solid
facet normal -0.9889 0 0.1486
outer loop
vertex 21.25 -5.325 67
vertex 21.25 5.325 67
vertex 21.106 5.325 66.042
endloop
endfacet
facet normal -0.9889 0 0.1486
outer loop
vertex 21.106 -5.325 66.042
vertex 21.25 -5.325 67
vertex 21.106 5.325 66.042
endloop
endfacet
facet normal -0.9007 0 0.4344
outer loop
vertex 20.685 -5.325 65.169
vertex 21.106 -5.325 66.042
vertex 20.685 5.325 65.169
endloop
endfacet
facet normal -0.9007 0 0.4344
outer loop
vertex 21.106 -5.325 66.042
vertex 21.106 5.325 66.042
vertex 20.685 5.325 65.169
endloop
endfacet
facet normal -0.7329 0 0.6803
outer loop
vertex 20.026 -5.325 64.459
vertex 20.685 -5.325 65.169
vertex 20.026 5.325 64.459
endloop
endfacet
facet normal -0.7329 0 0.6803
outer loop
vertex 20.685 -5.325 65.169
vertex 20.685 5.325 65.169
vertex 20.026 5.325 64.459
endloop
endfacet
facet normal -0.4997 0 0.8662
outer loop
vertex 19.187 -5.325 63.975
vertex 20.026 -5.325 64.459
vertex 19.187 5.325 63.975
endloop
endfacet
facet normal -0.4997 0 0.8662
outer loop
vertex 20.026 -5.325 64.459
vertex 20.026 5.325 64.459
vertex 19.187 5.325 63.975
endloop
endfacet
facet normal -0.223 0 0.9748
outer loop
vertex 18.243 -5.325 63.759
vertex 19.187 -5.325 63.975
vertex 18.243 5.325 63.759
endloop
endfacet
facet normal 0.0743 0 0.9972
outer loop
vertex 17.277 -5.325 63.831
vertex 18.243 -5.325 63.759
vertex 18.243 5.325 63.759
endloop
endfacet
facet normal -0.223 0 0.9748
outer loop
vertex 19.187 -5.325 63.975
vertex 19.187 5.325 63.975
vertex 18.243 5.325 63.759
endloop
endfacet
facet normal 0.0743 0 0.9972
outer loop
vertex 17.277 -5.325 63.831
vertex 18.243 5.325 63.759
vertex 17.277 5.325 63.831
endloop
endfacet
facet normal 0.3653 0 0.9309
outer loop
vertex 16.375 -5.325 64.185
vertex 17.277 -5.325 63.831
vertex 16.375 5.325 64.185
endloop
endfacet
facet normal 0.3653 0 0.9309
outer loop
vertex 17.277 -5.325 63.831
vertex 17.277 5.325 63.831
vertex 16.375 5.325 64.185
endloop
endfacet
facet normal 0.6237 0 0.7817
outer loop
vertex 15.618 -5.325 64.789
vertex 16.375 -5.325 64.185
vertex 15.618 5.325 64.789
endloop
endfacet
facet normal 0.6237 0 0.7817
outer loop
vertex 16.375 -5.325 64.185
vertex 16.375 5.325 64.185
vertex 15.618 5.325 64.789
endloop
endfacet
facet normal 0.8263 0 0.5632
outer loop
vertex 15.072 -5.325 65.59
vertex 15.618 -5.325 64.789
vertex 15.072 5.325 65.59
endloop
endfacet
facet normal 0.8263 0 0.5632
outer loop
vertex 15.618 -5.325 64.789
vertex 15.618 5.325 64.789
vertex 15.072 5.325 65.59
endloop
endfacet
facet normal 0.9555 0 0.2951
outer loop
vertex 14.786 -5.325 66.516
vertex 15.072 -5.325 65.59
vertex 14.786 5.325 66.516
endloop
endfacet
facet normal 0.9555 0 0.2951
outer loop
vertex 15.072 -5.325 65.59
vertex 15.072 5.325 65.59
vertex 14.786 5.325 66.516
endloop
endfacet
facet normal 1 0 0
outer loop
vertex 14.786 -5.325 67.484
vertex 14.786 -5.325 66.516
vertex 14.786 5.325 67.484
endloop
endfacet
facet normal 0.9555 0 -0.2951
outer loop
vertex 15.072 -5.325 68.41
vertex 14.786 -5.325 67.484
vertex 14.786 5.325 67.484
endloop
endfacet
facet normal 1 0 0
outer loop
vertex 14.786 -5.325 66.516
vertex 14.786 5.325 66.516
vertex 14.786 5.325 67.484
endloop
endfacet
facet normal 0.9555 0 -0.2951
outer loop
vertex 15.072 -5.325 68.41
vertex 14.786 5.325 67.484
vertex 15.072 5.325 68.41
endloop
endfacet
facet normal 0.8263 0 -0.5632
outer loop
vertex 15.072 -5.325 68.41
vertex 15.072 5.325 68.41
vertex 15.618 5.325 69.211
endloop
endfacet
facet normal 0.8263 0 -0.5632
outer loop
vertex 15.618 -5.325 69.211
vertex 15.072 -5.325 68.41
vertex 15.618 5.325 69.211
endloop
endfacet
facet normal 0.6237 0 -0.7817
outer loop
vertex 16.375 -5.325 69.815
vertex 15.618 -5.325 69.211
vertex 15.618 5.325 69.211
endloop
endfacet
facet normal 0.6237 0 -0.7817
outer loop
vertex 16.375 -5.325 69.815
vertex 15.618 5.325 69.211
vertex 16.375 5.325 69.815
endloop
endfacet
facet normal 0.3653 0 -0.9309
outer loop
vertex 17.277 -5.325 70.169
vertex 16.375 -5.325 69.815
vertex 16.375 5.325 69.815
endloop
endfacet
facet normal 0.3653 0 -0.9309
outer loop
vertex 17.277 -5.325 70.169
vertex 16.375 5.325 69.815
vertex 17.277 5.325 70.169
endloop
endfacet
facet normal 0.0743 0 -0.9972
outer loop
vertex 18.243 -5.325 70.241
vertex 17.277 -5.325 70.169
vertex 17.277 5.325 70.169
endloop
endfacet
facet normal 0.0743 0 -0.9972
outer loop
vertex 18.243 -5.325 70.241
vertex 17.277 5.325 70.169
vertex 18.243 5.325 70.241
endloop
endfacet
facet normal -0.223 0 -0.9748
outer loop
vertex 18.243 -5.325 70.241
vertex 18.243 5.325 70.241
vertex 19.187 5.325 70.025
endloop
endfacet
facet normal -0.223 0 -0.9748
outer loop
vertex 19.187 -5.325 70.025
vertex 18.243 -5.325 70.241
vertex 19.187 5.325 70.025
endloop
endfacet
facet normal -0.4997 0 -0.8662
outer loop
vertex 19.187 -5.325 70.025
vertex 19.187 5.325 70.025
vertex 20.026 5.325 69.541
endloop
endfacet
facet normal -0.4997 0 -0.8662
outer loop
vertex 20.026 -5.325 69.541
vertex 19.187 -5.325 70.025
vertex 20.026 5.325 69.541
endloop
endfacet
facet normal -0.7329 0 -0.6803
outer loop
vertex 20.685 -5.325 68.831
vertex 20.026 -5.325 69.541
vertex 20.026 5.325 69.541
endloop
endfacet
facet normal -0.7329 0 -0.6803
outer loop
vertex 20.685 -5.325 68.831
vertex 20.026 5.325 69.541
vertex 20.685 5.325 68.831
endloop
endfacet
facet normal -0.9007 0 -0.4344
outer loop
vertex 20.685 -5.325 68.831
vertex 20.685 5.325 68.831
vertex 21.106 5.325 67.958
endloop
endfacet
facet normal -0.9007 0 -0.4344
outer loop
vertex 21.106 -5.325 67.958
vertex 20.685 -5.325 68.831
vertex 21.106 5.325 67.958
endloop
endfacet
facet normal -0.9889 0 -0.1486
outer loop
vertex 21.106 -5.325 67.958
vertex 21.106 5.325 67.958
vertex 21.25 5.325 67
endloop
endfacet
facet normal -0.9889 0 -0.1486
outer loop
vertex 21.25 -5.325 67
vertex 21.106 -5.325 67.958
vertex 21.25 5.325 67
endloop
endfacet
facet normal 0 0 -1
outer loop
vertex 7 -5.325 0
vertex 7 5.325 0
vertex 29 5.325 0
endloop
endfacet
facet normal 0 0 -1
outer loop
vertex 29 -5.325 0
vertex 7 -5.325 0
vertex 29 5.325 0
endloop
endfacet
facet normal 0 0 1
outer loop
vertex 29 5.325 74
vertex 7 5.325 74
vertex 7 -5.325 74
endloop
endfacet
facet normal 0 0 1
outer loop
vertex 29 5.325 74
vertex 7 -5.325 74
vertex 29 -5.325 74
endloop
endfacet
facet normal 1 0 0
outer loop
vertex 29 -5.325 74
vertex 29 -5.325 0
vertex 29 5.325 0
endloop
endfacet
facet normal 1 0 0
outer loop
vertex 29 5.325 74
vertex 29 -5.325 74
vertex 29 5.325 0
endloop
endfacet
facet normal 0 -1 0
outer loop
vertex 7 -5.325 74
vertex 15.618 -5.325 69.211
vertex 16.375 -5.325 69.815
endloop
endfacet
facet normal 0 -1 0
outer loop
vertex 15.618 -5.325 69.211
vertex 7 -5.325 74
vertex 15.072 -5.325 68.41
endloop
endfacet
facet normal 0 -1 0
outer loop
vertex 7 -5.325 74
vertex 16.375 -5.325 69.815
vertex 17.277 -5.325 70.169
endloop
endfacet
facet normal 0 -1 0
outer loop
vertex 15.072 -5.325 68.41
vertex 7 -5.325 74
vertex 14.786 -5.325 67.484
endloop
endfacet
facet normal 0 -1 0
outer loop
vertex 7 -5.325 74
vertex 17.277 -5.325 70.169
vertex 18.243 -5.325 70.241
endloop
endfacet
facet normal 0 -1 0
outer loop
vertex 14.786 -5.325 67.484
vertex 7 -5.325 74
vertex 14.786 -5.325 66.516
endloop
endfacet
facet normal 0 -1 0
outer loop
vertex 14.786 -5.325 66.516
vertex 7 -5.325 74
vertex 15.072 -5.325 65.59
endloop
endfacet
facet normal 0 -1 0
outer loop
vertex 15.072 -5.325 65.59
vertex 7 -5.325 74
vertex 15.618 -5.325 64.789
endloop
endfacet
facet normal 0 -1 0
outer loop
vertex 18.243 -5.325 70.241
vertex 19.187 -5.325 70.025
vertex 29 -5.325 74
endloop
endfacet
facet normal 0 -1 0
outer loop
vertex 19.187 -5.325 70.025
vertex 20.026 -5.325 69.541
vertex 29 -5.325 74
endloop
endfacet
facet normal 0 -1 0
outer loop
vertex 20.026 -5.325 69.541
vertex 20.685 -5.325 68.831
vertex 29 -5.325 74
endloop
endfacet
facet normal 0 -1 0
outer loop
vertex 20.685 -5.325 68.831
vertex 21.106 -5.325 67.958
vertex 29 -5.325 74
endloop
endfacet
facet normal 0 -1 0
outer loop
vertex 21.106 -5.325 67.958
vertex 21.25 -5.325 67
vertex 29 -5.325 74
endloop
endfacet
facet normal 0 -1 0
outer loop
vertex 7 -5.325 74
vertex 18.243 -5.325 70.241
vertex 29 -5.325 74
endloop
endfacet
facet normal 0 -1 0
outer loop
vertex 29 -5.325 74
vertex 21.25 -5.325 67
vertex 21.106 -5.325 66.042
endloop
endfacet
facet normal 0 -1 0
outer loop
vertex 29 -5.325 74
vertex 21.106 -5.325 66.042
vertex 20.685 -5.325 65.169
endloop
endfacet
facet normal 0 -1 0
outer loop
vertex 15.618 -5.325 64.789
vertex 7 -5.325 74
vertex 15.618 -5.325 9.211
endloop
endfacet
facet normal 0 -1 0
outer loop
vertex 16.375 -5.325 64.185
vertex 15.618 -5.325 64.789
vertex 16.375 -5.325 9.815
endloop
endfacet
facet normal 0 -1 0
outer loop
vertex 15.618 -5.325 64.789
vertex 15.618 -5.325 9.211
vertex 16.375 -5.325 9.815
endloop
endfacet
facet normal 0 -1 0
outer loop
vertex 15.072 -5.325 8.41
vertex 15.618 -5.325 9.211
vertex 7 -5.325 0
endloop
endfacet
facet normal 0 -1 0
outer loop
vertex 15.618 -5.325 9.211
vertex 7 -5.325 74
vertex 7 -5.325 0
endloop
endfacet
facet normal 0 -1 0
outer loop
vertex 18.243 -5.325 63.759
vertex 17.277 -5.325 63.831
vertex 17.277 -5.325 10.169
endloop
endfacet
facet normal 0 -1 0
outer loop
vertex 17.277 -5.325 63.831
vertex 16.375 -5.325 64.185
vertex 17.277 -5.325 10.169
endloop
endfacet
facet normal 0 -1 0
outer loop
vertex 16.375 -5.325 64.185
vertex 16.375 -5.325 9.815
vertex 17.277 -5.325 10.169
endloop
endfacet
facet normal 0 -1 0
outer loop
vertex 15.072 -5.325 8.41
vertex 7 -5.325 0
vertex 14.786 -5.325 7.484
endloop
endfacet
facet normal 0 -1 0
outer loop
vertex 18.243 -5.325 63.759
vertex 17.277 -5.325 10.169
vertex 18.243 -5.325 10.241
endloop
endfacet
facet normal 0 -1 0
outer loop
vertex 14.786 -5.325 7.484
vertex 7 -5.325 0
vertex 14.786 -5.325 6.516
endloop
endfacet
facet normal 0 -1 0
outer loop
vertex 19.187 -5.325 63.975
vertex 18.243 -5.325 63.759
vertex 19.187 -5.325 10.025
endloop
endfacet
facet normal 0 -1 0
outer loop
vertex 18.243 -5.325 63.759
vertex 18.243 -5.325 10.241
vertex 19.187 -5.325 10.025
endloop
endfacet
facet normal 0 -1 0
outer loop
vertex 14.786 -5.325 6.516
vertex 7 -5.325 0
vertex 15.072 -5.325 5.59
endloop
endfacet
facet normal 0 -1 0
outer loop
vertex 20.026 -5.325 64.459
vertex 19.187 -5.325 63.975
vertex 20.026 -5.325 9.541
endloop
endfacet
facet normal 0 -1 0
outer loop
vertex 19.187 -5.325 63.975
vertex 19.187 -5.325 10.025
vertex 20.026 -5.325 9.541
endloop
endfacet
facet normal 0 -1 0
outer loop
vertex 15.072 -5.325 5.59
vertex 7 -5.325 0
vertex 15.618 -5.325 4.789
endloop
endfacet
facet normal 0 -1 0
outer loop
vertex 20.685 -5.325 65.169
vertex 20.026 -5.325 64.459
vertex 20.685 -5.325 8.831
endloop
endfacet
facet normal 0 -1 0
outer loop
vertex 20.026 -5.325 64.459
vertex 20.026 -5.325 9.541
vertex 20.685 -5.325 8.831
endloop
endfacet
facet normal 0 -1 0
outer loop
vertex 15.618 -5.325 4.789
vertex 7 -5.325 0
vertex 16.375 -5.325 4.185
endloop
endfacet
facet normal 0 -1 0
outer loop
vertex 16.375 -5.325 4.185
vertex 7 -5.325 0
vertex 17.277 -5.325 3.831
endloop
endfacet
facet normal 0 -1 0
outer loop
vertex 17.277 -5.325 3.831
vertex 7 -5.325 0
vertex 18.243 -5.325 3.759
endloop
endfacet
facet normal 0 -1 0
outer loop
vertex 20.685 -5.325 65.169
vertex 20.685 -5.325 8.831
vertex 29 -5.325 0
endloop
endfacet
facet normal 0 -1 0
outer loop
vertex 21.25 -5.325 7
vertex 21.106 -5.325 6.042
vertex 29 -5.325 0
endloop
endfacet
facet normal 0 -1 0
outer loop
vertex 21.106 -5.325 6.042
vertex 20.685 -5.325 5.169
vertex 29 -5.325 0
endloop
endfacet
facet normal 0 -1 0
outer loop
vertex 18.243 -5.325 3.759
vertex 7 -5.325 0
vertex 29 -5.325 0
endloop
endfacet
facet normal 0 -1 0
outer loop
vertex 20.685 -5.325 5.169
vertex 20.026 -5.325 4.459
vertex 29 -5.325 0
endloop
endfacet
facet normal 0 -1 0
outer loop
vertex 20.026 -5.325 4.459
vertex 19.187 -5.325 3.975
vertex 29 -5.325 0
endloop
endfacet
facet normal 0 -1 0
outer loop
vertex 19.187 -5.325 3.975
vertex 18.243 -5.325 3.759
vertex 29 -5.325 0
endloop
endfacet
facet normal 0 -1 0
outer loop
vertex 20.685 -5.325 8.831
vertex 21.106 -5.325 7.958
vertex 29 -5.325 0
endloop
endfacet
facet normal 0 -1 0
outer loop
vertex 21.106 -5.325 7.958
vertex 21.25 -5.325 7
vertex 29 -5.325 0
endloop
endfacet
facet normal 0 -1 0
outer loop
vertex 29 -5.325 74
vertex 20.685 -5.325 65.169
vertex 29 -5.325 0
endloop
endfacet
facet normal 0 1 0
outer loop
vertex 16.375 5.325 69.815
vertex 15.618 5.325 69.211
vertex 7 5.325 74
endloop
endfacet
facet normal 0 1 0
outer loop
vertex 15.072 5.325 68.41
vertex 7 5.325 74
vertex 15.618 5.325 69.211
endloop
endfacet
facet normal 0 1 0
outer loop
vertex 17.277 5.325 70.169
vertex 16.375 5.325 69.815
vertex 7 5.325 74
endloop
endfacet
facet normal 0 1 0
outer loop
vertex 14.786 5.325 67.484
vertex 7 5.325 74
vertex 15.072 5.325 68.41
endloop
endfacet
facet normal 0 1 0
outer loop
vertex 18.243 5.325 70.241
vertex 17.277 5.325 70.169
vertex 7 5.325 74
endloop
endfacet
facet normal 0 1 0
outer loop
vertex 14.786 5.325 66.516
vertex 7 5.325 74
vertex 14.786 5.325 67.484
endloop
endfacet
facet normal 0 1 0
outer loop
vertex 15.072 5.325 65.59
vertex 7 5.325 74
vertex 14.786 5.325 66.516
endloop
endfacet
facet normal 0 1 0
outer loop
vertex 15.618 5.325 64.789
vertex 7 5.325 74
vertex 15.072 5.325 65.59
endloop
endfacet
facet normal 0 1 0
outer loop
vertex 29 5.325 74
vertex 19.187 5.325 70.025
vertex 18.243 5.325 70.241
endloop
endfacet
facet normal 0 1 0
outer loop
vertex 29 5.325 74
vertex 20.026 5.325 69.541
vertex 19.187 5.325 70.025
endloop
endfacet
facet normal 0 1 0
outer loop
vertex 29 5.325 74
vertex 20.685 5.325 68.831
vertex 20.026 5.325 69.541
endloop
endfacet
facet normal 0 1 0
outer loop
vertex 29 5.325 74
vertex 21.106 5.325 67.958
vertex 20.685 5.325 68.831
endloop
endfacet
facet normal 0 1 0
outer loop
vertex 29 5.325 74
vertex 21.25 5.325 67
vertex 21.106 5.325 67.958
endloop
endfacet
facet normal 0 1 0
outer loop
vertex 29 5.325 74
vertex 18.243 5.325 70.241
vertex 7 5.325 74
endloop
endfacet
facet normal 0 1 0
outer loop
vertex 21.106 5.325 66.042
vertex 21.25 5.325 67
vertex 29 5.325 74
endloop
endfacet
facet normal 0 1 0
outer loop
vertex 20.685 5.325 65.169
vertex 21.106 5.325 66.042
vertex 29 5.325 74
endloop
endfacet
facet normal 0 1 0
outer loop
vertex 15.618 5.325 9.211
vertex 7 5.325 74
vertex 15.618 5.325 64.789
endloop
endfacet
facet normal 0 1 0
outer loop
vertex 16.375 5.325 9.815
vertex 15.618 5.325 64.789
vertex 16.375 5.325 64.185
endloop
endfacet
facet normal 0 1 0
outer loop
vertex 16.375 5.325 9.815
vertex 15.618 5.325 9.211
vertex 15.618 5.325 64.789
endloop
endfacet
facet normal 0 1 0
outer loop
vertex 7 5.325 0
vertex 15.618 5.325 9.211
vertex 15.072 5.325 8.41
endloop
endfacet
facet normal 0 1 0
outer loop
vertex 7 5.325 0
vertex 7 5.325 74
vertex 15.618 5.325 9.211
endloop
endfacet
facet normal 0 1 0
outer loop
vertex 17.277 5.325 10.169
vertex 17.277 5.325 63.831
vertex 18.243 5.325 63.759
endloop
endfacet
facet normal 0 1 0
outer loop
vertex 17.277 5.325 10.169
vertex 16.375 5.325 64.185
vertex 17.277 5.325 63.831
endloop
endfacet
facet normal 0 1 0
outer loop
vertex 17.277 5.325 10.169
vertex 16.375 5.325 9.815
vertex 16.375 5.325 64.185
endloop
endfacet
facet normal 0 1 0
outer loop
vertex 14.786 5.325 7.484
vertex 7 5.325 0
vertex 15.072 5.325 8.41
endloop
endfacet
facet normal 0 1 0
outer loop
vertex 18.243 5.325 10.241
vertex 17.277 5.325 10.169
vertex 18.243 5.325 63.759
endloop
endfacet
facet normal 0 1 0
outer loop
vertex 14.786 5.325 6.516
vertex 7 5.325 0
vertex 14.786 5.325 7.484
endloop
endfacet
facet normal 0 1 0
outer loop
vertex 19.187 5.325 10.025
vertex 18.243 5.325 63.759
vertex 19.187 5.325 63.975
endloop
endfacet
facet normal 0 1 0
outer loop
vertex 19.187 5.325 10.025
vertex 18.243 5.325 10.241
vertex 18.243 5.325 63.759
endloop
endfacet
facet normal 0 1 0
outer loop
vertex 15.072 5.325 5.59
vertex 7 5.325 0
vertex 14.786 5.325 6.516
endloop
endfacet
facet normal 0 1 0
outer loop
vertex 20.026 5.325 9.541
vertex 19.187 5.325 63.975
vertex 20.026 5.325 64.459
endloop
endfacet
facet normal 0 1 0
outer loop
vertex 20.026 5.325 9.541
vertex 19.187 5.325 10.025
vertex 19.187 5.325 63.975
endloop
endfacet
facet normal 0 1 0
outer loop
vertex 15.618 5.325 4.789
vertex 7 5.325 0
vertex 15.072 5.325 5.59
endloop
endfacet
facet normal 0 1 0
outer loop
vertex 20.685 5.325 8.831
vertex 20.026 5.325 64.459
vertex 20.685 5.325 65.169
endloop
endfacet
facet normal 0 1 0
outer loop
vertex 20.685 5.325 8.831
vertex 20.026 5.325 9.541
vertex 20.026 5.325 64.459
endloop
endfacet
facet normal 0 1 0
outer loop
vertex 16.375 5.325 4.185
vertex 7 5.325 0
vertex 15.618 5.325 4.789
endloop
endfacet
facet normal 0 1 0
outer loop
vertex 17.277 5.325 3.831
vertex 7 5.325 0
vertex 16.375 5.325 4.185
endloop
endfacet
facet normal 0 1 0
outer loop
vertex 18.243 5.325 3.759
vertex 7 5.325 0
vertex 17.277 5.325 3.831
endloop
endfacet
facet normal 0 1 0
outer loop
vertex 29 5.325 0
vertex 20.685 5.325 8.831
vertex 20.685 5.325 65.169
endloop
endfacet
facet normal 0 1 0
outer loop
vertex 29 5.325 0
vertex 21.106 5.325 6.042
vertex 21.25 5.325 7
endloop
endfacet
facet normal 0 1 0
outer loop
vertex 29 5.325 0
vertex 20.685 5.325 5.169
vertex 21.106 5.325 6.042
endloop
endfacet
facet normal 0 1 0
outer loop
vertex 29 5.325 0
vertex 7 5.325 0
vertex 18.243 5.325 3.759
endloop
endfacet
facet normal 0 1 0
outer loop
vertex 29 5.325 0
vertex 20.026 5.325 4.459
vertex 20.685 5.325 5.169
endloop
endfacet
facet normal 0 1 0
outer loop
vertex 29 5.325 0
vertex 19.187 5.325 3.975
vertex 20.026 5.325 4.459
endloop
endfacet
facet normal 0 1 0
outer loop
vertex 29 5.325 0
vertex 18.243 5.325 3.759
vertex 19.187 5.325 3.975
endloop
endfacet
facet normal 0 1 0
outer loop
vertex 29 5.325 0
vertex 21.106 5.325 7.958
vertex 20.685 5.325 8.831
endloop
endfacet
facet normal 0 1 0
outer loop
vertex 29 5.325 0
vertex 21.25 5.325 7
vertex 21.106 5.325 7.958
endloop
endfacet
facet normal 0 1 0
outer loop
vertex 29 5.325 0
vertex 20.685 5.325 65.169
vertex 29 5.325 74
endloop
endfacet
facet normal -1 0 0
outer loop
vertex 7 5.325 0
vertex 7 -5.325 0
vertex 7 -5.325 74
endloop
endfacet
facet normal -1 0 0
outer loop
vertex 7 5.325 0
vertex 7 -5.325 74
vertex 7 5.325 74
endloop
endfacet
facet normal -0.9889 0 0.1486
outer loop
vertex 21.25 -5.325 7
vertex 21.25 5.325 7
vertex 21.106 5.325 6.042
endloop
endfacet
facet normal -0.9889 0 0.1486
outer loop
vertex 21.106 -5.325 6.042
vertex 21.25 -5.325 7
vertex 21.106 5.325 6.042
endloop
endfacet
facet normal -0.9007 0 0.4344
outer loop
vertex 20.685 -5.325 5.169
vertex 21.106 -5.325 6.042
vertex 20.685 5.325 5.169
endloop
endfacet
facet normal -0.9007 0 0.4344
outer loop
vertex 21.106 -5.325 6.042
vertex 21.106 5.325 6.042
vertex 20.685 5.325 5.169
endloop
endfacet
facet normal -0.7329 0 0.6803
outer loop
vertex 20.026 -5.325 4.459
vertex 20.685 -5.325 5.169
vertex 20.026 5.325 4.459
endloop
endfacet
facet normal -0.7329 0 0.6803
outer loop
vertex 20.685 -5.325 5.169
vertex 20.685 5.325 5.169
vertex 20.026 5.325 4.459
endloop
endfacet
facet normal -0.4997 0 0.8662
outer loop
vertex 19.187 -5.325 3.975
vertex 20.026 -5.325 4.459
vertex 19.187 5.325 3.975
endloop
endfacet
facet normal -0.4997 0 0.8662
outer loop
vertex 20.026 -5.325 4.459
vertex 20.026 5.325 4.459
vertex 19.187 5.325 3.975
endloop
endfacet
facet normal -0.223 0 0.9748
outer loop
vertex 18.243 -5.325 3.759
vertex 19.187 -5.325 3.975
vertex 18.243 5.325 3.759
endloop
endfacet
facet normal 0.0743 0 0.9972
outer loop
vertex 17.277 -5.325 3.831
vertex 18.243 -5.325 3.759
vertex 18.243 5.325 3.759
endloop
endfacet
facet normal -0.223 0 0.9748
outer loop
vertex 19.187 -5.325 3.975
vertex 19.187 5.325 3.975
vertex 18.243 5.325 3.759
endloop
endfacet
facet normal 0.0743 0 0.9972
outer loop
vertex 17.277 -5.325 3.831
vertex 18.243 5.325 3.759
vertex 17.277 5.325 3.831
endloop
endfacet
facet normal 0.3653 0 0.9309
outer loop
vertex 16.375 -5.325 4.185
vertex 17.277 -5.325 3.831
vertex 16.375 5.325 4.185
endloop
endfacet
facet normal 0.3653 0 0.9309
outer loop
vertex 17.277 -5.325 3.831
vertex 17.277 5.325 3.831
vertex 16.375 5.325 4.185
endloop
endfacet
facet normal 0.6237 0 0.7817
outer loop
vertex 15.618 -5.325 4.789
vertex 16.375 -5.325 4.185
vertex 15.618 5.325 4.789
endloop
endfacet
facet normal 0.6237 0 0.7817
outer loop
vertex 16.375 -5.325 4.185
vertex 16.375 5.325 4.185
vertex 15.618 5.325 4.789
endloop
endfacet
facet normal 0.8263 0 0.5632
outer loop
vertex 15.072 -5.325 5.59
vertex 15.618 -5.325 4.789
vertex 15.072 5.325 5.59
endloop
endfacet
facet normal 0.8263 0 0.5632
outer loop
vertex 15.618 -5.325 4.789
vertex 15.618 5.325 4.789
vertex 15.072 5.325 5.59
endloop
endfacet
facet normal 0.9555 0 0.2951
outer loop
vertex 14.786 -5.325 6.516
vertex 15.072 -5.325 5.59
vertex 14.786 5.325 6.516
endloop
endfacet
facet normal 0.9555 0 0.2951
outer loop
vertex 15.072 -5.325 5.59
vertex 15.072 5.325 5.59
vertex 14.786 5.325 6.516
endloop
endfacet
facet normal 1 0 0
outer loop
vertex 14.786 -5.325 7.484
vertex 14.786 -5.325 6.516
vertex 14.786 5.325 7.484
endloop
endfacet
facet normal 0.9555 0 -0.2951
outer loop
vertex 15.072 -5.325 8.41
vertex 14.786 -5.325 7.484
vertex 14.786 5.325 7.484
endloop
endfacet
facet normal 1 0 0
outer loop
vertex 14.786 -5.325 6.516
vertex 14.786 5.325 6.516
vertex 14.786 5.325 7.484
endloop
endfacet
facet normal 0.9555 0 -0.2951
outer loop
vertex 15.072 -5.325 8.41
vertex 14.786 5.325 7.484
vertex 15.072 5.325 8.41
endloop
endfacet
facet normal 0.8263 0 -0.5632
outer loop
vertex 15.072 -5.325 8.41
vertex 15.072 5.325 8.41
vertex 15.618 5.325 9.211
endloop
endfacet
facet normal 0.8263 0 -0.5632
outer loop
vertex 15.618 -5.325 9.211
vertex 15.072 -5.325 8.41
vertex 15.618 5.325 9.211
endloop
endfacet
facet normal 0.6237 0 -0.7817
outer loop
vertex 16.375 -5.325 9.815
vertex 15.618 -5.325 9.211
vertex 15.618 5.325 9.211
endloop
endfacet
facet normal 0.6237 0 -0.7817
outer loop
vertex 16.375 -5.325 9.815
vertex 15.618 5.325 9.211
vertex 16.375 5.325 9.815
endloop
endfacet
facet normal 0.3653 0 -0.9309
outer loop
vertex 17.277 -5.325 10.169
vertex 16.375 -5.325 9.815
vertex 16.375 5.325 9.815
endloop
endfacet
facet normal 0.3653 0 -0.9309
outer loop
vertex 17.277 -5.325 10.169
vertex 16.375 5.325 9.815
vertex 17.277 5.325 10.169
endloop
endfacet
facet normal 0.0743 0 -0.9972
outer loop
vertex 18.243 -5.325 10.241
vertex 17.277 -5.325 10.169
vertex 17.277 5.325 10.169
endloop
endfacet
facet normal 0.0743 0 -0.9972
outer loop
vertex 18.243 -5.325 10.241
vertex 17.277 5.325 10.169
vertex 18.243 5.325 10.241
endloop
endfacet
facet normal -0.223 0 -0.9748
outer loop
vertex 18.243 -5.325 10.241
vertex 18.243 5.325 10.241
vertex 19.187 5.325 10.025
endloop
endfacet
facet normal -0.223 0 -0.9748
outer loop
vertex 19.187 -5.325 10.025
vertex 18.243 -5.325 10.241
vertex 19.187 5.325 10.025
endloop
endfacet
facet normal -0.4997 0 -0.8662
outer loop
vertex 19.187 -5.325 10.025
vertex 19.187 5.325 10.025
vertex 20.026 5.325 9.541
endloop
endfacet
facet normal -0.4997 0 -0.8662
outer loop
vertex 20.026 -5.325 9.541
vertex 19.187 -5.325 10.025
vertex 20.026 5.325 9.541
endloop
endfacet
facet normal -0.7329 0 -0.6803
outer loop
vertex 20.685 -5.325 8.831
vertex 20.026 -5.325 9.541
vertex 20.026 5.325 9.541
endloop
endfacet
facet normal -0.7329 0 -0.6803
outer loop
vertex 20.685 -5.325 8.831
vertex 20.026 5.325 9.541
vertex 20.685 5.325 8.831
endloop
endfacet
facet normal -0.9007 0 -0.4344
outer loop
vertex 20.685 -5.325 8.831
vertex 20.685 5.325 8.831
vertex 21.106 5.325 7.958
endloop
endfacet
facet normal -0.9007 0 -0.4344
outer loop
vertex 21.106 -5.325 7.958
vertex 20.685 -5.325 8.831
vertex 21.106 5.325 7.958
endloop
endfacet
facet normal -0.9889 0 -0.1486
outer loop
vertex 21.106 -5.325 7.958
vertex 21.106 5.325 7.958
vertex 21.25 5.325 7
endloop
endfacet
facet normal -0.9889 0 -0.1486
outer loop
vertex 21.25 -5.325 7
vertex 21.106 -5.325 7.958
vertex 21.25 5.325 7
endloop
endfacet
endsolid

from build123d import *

# Parameters (mm, degrees)
CROQUIS1_W              = 22
CROQUIS1_H              = 10.65
SALIENTE_EXTRUIR1_DEPTH = 74
CORTAR_EXTRUIR1_REACH   = 12.65
CROQUIS2_R              = 3.25


with BuildPart() as part:
    # Croquis1 → Saliente-Extruir1 (new body)
    with BuildSketch(Plane.XY):
        with Locations((18, 0)):
            Rectangle(CROQUIS1_W, CROQUIS1_H)
    extrude(amount=SALIENTE_EXTRUIR1_DEPTH)

    # Croquis2 → Cortar-Extruir1 (cut, up to next)
    with BuildSketch(Plane(origin=(0, 5.325, 0), x_dir=(1, 0, 0), z_dir=(0, 1, 0)), mode=Mode.PRIVATE) as cortar_extruir1_sk1:
        with Locations((18, -7)):
            Circle(CROQUIS2_R)
    cortar_extruir1_tool1 = extrude(cortar_extruir1_sk1.sketch, amount=-CORTAR_EXTRUIR1_REACH, mode=Mode.PRIVATE) & part.part
    add(cortar_extruir1_tool1.solids().sort_by_distance((18, 5.325, 7))[0], mode=Mode.SUBTRACT)
    # Croquis2 → Cortar-Extruir1 (cut, up to next)
    with BuildSketch(Plane(origin=(0, 5.325, 0), x_dir=(1, 0, 0), z_dir=(0, 1, 0)), mode=Mode.PRIVATE) as cortar_extruir1_sk2:
        with Locations((18, -67)):
            Circle(CROQUIS2_R)
    cortar_extruir1_tool2 = extrude(cortar_extruir1_sk2.sketch, amount=-CORTAR_EXTRUIR1_REACH, mode=Mode.PRIVATE) & part.part
    add(cortar_extruir1_tool2.solids().sort_by_distance((18, 5.325, 67))[0], mode=Mode.SUBTRACT)


solid = part.part
